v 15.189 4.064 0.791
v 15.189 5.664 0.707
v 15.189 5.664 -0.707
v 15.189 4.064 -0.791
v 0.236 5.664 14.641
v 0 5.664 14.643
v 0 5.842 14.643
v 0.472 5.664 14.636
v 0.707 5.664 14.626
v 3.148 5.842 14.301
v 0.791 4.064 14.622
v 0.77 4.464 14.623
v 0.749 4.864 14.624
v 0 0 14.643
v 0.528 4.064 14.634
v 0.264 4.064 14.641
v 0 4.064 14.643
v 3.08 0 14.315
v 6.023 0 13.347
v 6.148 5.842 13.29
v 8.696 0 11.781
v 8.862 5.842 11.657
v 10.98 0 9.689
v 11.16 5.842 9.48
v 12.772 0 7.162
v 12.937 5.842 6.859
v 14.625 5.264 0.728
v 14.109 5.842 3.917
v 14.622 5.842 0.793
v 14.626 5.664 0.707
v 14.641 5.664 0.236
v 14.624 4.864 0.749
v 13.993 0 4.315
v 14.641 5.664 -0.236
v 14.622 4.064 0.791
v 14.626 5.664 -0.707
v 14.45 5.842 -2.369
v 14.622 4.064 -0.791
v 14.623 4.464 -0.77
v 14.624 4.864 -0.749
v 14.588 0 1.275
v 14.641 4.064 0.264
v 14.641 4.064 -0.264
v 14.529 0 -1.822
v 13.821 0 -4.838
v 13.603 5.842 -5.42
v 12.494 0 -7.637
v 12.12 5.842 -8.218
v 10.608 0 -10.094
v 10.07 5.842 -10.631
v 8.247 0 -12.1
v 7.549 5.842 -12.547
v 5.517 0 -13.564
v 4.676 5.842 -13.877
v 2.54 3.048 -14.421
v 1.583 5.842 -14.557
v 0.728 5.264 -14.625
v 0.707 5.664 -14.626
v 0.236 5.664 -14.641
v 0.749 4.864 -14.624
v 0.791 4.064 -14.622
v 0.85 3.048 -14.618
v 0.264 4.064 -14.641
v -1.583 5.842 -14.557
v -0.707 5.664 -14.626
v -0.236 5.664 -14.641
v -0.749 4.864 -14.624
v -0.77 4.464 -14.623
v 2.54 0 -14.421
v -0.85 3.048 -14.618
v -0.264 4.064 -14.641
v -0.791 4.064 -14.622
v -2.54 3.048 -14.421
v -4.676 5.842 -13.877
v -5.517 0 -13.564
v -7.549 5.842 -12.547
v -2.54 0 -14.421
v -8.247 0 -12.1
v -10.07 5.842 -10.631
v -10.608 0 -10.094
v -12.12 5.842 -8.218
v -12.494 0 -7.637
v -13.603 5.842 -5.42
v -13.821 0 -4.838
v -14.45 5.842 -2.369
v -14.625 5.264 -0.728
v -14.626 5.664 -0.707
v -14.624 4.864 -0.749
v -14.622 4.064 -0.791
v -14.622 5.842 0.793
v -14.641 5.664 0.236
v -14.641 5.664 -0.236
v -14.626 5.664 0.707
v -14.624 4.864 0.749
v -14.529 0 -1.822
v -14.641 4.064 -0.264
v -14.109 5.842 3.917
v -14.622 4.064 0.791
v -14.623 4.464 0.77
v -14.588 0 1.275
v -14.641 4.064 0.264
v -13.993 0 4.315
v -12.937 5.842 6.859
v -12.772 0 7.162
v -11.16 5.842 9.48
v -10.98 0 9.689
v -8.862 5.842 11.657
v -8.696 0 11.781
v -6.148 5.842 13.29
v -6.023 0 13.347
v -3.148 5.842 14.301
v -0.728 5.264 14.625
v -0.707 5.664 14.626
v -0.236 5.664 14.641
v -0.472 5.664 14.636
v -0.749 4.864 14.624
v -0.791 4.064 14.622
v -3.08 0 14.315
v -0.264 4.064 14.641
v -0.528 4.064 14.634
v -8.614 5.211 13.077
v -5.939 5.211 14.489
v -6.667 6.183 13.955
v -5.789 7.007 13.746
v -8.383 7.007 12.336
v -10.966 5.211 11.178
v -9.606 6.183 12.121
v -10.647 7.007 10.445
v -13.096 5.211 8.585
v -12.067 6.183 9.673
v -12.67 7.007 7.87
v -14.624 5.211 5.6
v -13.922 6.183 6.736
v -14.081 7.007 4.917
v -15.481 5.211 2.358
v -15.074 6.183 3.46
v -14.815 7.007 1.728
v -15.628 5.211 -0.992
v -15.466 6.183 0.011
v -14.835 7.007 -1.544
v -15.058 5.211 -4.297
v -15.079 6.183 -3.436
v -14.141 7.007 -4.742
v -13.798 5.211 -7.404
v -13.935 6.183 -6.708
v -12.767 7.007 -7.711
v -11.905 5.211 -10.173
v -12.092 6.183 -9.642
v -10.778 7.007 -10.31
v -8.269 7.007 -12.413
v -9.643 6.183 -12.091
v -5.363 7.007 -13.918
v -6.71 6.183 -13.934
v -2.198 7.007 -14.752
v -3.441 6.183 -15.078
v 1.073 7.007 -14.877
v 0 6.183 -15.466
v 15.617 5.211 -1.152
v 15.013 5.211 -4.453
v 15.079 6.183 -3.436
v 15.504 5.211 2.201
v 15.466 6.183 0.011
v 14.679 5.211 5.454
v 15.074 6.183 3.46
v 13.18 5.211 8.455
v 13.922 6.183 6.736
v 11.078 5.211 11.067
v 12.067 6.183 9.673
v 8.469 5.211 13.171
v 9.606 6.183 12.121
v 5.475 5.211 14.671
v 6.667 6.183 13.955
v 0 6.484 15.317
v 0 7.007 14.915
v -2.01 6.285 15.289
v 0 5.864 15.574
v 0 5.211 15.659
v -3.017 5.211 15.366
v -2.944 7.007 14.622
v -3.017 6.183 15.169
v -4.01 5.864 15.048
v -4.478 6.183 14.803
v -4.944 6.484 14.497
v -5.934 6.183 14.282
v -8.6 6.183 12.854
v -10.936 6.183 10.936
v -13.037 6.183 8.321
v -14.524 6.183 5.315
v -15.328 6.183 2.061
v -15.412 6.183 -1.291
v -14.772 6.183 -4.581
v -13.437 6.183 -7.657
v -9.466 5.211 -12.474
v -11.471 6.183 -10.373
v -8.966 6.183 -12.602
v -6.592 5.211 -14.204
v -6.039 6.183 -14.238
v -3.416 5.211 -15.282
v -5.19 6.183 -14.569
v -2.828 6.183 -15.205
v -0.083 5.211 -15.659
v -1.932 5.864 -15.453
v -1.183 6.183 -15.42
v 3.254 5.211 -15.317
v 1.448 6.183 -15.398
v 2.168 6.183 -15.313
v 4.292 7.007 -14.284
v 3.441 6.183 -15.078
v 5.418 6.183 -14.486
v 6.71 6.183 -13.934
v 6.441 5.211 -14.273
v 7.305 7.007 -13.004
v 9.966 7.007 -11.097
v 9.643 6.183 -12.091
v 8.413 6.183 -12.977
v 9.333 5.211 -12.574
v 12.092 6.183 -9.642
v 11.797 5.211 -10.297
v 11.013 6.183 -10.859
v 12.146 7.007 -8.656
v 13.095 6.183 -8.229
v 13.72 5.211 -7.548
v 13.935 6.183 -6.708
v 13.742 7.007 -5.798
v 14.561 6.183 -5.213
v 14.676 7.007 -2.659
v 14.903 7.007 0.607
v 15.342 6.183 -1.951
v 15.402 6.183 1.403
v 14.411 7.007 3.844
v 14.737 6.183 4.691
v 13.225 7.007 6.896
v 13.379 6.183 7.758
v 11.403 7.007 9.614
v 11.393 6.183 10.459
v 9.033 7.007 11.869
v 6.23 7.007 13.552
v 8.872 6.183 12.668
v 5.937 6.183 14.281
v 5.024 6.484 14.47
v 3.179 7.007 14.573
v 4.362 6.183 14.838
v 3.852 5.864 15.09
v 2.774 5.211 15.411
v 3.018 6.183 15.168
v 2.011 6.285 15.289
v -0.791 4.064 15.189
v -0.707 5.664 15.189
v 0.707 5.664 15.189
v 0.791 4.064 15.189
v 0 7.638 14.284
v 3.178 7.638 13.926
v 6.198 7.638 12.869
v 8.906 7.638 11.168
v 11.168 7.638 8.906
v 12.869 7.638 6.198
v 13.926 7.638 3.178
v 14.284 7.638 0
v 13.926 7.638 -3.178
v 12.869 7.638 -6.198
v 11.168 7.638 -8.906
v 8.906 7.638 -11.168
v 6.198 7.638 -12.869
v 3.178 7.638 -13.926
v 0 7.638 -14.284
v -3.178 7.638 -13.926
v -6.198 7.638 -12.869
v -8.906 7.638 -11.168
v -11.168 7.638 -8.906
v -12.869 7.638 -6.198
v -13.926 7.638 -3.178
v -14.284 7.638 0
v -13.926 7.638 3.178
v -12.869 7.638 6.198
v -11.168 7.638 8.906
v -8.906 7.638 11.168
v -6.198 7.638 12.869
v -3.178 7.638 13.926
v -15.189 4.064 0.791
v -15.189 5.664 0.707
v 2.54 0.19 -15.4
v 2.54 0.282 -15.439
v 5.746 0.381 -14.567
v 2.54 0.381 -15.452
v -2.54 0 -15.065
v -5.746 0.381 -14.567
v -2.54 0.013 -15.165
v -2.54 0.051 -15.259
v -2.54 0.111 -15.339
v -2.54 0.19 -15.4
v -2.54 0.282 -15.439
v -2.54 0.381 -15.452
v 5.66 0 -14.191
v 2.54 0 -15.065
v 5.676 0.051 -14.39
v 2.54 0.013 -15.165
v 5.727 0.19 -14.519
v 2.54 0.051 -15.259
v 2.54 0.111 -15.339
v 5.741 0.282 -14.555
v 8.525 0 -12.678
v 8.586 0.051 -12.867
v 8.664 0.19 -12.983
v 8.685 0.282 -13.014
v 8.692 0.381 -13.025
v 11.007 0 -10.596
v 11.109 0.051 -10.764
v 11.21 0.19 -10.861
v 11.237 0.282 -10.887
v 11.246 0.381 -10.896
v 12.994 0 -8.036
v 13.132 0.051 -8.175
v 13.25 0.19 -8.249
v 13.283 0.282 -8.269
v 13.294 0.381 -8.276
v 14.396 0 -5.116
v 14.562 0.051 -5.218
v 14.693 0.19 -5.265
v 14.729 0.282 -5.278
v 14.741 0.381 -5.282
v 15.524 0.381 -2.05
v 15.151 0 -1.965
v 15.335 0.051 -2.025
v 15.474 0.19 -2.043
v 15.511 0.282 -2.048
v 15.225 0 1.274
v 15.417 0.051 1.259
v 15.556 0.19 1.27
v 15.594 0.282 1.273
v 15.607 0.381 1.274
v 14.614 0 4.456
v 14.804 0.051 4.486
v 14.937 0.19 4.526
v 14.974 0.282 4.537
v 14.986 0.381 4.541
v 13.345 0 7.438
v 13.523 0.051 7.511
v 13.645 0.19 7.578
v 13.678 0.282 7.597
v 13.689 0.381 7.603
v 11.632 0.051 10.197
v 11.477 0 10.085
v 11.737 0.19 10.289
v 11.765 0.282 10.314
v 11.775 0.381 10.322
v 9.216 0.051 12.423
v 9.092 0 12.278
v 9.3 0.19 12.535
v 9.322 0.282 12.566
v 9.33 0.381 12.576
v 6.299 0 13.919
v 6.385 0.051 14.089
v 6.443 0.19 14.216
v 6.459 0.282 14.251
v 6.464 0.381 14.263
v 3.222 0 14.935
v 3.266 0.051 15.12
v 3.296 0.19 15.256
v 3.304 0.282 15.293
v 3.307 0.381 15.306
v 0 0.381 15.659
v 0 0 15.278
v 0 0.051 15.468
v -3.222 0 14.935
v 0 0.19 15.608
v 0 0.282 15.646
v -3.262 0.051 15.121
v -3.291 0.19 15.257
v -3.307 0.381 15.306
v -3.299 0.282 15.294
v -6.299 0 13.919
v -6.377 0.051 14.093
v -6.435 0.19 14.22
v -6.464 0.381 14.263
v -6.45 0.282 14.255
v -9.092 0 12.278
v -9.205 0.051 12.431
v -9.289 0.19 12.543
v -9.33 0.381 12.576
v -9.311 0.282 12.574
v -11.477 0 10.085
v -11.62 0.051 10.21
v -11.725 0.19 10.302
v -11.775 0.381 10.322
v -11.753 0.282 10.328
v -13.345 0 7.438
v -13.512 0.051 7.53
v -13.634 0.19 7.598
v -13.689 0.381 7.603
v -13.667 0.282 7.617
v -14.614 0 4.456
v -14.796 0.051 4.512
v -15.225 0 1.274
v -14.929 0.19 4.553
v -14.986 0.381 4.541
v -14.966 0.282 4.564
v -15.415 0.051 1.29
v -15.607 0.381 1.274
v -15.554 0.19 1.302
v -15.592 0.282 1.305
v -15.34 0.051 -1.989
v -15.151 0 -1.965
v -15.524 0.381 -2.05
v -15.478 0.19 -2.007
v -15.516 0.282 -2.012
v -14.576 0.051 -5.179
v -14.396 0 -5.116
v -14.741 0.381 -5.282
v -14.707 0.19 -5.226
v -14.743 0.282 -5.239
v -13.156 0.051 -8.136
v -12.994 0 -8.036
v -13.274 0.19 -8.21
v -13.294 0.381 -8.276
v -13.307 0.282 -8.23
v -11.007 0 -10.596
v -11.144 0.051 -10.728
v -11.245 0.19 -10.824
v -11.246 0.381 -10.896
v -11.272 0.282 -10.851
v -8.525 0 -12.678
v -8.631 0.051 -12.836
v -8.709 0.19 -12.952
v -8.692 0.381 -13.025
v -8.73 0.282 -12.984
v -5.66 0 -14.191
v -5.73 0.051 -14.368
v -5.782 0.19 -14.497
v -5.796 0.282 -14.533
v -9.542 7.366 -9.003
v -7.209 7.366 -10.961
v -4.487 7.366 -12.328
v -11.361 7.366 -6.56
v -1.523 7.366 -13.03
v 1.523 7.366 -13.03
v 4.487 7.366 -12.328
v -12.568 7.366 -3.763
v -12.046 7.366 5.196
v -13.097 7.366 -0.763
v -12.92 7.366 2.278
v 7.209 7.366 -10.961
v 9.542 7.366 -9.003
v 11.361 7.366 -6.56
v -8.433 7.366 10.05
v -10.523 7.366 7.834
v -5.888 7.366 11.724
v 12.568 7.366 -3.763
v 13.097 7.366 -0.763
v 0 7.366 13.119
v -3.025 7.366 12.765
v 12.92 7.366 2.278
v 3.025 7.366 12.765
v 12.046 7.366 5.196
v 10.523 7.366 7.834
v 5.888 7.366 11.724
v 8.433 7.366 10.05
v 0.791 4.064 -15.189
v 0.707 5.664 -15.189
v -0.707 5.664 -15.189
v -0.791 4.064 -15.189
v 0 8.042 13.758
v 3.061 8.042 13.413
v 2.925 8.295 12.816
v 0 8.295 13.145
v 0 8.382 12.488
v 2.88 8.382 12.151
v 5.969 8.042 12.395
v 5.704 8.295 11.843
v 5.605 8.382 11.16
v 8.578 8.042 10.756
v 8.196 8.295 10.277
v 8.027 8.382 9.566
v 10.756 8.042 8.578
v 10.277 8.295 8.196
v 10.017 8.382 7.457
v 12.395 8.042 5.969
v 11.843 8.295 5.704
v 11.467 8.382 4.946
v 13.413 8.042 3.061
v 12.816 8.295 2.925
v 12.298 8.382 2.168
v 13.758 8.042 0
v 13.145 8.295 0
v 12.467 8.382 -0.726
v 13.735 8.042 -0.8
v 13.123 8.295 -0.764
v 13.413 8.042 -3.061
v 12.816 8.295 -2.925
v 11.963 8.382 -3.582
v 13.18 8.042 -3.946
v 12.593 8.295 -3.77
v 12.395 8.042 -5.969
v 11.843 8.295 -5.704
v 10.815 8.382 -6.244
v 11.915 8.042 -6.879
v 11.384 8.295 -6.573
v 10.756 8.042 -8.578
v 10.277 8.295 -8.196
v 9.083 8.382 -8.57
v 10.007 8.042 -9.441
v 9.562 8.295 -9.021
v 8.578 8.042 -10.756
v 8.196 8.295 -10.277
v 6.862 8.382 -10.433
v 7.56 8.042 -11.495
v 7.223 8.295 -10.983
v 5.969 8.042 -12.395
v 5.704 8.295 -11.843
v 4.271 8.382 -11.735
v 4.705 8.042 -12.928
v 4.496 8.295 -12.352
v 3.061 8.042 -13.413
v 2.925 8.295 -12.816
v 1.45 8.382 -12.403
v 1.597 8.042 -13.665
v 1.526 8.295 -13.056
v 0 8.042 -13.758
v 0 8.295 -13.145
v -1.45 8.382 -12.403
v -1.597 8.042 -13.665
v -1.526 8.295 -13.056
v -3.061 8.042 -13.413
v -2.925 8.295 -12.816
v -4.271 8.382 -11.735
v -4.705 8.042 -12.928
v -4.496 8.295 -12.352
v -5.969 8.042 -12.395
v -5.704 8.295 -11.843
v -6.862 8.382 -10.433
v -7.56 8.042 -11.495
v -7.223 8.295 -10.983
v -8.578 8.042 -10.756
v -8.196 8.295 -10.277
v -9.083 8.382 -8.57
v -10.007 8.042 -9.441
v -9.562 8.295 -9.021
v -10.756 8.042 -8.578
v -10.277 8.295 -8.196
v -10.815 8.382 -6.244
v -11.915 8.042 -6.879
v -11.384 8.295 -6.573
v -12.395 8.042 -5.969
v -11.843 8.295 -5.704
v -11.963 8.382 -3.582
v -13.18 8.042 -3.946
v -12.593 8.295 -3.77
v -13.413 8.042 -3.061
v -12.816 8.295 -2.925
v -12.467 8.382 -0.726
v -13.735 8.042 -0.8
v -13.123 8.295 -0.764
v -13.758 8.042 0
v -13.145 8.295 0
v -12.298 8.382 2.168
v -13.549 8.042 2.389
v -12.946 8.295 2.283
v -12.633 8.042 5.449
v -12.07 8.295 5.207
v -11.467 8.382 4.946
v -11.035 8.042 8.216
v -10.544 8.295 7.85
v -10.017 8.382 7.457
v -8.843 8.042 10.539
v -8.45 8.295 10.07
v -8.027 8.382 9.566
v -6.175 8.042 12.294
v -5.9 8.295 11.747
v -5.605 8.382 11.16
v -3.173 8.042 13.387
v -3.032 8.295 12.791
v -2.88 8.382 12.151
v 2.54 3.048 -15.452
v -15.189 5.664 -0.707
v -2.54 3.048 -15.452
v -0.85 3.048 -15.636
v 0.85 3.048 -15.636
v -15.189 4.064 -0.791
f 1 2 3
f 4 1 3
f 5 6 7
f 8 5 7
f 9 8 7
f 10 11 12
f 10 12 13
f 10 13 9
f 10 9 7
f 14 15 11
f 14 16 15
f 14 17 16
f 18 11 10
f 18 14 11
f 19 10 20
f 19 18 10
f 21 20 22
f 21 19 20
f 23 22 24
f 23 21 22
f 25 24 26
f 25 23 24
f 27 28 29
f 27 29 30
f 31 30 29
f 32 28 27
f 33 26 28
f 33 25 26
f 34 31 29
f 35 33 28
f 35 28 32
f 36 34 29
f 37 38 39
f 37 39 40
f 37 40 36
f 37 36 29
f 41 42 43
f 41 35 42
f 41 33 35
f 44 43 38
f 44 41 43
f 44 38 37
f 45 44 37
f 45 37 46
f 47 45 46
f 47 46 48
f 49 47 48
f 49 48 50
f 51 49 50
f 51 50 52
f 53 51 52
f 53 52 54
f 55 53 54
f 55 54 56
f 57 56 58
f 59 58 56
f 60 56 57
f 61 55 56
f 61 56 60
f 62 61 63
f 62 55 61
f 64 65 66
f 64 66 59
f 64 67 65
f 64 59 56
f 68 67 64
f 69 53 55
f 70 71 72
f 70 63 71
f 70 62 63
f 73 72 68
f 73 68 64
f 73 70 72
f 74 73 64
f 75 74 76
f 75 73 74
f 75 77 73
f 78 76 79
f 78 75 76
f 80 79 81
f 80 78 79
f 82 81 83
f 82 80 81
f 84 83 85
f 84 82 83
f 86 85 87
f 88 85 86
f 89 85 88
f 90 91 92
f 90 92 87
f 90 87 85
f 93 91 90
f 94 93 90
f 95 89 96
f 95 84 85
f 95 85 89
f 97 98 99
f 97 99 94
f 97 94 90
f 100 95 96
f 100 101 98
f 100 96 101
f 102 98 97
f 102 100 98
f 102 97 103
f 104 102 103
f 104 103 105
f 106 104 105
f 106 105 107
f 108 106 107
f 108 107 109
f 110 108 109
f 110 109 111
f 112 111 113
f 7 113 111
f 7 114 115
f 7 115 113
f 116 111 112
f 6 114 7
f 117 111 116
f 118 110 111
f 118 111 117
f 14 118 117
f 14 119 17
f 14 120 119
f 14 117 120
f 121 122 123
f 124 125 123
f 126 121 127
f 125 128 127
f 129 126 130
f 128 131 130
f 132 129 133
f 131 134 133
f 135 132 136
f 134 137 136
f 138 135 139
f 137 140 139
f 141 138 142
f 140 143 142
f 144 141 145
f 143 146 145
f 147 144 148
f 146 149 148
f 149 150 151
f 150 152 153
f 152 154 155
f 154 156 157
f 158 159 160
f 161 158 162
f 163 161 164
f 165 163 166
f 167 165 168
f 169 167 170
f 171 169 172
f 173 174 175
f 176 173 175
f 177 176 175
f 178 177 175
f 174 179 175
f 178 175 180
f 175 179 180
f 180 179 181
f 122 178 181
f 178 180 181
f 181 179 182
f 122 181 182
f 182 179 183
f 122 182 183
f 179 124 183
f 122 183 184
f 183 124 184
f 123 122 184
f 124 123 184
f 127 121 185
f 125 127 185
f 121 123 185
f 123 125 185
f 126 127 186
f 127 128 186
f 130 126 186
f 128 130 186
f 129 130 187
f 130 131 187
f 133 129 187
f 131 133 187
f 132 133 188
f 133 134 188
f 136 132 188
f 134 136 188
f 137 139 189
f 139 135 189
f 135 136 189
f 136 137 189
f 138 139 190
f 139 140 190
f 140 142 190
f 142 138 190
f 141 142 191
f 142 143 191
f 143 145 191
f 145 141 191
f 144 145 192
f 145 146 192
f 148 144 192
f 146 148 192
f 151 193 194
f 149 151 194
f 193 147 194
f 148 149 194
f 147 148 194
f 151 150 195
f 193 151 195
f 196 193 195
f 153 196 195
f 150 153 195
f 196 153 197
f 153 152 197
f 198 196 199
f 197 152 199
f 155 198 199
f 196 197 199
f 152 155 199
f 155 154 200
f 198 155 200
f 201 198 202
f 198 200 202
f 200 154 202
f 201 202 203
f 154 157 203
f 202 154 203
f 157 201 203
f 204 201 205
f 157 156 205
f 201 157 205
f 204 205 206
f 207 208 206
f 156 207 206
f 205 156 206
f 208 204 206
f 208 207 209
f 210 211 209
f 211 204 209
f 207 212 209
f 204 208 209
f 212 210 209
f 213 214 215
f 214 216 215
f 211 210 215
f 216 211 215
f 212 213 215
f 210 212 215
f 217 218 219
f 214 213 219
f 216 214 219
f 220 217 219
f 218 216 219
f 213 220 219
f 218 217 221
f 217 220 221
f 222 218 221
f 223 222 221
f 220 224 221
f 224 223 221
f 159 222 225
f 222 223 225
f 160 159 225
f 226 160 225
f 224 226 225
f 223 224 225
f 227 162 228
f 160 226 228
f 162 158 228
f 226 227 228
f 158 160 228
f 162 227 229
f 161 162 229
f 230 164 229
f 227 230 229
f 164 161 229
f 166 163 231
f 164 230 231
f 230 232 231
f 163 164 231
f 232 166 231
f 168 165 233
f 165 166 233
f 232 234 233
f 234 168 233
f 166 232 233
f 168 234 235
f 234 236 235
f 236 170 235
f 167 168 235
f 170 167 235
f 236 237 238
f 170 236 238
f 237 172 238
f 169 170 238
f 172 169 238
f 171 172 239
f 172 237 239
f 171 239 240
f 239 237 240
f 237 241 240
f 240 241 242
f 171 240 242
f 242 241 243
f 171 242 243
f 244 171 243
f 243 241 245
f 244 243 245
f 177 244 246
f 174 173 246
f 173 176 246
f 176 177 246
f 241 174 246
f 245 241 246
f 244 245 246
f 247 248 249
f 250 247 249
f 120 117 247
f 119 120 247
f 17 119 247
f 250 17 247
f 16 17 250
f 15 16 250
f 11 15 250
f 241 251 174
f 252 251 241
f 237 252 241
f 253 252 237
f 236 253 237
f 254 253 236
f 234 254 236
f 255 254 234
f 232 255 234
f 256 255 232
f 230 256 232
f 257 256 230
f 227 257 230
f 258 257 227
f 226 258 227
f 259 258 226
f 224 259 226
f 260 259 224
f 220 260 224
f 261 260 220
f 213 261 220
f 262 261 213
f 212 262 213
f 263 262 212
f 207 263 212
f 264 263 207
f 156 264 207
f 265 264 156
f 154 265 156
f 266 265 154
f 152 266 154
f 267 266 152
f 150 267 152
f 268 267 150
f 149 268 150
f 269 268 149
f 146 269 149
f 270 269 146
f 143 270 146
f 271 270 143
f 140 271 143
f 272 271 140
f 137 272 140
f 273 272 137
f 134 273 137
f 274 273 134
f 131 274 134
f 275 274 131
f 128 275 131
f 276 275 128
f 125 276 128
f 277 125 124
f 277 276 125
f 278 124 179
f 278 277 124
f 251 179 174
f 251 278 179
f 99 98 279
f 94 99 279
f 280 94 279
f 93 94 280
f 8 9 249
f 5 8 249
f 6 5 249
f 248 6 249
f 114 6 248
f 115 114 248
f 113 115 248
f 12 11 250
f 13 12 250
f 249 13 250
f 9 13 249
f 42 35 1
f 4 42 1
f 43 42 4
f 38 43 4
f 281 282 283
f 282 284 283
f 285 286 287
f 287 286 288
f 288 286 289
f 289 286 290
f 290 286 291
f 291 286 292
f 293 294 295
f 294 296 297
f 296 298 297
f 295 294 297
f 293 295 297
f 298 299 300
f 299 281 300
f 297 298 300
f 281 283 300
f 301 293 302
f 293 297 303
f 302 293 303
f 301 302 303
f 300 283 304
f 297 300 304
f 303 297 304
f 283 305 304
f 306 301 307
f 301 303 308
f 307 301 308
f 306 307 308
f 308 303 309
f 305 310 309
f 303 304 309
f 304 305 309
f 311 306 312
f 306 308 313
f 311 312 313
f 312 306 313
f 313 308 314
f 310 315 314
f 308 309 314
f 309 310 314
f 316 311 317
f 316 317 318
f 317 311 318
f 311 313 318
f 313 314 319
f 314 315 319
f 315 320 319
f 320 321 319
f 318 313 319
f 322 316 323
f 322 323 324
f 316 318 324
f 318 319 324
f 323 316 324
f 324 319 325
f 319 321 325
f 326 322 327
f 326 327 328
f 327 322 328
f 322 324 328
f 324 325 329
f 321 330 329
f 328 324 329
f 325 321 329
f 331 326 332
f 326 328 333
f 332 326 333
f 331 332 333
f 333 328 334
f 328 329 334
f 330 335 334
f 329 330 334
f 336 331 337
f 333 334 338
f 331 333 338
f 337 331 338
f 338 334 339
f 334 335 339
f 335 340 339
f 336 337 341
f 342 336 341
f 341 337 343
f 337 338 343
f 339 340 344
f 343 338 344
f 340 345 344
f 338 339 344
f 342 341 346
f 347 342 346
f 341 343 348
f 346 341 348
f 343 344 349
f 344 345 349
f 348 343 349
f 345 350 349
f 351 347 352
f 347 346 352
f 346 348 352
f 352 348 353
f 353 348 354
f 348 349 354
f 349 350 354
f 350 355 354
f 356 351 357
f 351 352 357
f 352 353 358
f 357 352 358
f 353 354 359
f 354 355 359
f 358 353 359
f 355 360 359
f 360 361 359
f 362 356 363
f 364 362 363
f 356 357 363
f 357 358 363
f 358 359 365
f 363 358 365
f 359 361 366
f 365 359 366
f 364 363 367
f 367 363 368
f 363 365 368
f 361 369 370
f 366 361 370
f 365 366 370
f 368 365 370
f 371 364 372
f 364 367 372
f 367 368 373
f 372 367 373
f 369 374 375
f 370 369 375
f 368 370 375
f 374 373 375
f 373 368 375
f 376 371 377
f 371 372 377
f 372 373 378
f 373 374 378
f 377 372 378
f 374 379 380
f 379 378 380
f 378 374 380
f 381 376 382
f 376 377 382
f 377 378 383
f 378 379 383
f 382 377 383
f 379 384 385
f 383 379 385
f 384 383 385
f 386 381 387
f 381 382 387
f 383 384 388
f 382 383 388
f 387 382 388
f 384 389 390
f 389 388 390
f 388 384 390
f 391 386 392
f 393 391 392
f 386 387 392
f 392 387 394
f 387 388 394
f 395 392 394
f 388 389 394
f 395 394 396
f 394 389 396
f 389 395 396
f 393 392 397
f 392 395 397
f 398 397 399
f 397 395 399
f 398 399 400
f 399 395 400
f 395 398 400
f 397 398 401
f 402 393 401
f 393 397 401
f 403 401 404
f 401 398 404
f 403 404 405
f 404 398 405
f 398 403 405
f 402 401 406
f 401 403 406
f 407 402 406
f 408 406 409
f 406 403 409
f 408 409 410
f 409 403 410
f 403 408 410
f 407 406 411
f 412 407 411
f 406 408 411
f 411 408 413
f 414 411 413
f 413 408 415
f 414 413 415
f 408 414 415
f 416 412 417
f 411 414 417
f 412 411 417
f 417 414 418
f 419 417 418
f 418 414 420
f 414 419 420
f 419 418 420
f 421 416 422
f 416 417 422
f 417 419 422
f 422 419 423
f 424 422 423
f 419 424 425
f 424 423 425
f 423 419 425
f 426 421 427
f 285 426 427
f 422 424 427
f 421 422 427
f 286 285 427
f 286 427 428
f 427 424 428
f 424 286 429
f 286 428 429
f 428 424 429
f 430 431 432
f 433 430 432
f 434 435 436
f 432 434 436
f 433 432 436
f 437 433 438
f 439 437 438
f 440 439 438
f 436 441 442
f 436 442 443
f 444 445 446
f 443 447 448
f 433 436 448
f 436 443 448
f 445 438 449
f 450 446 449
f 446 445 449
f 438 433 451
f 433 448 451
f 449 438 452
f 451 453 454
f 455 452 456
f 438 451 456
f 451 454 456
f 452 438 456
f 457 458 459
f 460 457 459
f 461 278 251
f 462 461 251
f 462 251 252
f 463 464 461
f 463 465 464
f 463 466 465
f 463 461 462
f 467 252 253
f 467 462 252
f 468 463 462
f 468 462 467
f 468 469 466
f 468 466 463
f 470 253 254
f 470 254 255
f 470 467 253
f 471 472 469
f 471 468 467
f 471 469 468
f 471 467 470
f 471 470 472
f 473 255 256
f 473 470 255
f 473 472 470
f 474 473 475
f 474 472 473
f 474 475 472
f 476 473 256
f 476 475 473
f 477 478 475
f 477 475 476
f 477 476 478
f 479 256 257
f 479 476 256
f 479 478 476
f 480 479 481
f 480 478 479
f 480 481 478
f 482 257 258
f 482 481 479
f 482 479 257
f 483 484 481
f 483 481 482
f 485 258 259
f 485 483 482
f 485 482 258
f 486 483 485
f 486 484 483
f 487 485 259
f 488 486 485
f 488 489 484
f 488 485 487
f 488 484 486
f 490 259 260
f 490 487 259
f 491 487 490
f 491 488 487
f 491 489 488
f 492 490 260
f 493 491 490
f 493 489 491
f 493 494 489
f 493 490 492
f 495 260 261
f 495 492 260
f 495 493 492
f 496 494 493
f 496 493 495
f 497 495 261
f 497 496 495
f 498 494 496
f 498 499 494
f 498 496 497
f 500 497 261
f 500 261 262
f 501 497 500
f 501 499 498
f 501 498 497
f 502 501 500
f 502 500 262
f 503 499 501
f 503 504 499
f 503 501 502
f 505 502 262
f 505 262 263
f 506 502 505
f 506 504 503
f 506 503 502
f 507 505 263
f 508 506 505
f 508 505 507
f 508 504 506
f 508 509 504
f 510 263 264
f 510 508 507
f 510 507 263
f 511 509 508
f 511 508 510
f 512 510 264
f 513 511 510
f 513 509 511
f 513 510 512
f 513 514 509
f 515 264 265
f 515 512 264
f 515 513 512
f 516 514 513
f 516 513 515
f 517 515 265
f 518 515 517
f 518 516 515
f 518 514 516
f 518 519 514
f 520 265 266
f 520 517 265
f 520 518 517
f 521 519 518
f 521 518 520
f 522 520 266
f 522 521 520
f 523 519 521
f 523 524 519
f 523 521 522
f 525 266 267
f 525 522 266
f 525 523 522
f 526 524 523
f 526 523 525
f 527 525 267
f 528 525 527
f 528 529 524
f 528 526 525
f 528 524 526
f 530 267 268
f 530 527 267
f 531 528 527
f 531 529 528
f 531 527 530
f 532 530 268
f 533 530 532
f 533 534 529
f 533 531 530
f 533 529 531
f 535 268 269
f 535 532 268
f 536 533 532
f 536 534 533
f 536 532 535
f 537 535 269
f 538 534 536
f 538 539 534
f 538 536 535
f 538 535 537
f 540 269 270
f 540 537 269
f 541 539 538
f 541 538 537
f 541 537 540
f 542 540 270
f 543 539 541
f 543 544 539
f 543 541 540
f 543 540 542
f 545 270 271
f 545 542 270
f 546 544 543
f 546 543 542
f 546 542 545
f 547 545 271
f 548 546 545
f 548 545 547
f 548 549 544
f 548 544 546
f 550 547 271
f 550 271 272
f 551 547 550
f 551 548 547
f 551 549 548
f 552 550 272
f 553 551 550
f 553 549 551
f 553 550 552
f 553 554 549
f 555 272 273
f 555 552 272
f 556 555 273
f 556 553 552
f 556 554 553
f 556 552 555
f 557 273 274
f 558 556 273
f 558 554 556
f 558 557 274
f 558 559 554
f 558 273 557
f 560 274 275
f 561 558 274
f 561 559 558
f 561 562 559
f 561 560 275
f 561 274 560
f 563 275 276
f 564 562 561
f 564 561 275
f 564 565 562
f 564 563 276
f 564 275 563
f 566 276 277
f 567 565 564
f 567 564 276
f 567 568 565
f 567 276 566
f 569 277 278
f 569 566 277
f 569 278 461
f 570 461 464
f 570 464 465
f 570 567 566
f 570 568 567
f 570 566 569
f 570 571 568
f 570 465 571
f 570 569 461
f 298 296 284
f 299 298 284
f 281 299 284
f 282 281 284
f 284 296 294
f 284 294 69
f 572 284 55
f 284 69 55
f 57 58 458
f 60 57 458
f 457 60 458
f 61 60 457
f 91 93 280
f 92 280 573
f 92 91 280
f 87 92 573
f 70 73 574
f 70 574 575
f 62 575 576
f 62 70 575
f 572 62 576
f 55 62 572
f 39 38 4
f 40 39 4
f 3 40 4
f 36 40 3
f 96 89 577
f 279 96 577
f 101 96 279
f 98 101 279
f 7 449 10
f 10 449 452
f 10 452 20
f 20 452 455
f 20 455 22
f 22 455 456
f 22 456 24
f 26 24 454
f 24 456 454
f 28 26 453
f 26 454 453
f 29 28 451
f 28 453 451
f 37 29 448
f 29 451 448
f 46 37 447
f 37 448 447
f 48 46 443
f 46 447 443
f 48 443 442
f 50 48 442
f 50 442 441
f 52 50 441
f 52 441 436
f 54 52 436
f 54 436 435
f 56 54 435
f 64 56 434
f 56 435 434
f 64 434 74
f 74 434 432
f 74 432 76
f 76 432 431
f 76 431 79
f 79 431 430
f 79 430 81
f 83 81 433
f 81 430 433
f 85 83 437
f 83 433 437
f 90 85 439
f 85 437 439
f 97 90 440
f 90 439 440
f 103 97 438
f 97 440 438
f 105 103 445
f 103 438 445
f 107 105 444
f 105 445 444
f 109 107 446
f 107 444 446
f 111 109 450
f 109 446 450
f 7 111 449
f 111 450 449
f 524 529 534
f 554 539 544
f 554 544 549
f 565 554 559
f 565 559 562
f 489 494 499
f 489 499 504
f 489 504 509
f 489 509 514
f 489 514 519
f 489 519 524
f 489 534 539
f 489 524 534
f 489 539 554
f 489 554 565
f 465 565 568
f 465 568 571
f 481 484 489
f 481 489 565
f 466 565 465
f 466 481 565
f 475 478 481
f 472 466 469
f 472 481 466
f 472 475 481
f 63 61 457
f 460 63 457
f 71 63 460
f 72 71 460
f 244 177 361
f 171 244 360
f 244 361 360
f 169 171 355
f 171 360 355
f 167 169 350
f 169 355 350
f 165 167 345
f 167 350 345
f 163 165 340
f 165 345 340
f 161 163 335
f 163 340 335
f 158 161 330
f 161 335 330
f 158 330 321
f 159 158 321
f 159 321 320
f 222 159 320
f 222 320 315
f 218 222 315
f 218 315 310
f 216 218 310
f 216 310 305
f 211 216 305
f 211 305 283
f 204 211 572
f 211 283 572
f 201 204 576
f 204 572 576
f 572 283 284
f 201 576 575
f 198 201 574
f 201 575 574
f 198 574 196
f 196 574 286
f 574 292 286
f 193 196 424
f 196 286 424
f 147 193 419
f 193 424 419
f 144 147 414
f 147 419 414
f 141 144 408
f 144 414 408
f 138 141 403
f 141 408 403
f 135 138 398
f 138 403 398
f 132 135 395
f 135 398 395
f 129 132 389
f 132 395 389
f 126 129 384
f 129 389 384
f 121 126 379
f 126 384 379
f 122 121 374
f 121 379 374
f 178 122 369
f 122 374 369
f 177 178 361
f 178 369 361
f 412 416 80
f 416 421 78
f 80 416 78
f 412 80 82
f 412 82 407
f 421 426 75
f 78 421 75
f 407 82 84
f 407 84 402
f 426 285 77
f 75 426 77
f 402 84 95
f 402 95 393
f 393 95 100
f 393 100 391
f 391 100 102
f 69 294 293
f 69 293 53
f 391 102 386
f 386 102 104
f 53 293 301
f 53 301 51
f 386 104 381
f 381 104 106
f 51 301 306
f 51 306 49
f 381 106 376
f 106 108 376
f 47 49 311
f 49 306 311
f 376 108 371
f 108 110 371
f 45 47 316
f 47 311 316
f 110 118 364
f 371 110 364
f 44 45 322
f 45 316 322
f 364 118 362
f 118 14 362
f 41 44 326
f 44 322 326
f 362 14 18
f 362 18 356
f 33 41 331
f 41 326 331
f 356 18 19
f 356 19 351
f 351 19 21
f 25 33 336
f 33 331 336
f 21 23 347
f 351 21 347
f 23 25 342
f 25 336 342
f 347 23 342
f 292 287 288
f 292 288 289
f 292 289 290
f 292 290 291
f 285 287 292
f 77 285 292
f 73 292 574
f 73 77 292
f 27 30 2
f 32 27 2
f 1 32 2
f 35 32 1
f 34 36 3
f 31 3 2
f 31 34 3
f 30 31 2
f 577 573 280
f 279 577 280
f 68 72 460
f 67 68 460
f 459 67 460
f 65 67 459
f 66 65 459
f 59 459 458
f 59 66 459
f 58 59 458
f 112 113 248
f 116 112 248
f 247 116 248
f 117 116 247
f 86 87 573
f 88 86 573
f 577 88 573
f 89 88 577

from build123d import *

# Parameters (mm, degrees)
SKETCH1_R           = 14.6431
BOSS_EXTRUDE1_DEPTH = 7.366
FILLET1_SIZE        = 1.524
SHELL1_T            = 1.016
SKETCH2_W           = 5.08
SKETCH2_H           = 3.048
CUT_EXTRUDE1_DEPTH  = 25.4
FILLET2_R           = 0.381
SNAP_START          = 14.621716272
SNAP_GROOVE1_DEPTH  = 0.567483728
CIRPATTERN2_COUNT   = 4
FILLET3_R           = 2.54
FILLET4_R           = 2.54


# Read off the part's stored shape, not the designer's step: Snap Groove1
with BuildPart() as part:
    # Sketch1 → Boss-Extrude1 (new body)
    with BuildSketch(Plane(origin=(0, 0, 0), x_dir=(1, 0, 0), z_dir=(0, 1, 0))):
        with Locations(Location((0, 0, 0), (0, 0, 270))):
            Circle(SKETCH1_R)
    extrude(amount=BOSS_EXTRUDE1_DEPTH)

    # Fillet1
    fillet1_edges = [part.edges().sort_by_distance(p)[0] for p in [
        (0, 7.366, -14.6431),
    ]]
    chamfer(fillet1_edges, length=FILLET1_SIZE)

    # Shell1
    shell1_openings = [part.faces().sort_by_distance(p)[0] for p in [
        (0, 0, 0),
    ]]
    offset(amount=SHELL1_T, openings=shell1_openings, kind=Kind.INTERSECTION)

    # Sketch2 → Cut-Extrude1 (cut)
    with BuildSketch(Plane.XY):
        with Locations((0, 1.524)):
            Rectangle(SKETCH2_W, SKETCH2_H)
    extrude(amount=-CUT_EXTRUDE1_DEPTH, mode=Mode.SUBTRACT)

    # Fillet2
    fillet2_edges = [part.edges().sort_by_distance(p)[0] for p in [
        (15.607170203, 0, 1.274225676),
    ]]
    fillet(fillet2_edges, radius=FILLET2_R)

    # Snap Groove1 outline → Snap Groove1 (cut)
    with BuildSketch(Plane.XY.offset(SNAP_START)):
        Polygon((-0.707206527, 5.6642), (-0.791069456, 4.064), (0.791069456, 4.064), (0.707206527, 5.6642), align=None)
    snap_groove1 = extrude(amount=SNAP_GROOVE1_DEPTH, mode=Mode.SUBTRACT)

    # CirPattern2: Snap Groove1 ×4 about axis
    cirpattern2_axis = Axis((0, 0, 0), (0, 1, 0))
    for i in range(1, CIRPATTERN2_COUNT):
        add(snap_groove1.rotate(cirpattern2_axis, i * 360 / CIRPATTERN2_COUNT), mode=Mode.SUBTRACT)

    # Fillet3
    fillet3_edges = [part.edges().sort_by_distance(p)[0] for p in [
        (0, 8.382, -13.539940979),
    ]]
    fillet(fillet3_edges, radius=FILLET3_R)

    # Fillet4
    fillet4_edges = [part.edges().sort_by_distance(p)[0] for p in [
        (0, 6.262840979, -15.6591),
    ]]
    fillet(fillet4_edges, radius=FILLET4_R)


solid = part.part
